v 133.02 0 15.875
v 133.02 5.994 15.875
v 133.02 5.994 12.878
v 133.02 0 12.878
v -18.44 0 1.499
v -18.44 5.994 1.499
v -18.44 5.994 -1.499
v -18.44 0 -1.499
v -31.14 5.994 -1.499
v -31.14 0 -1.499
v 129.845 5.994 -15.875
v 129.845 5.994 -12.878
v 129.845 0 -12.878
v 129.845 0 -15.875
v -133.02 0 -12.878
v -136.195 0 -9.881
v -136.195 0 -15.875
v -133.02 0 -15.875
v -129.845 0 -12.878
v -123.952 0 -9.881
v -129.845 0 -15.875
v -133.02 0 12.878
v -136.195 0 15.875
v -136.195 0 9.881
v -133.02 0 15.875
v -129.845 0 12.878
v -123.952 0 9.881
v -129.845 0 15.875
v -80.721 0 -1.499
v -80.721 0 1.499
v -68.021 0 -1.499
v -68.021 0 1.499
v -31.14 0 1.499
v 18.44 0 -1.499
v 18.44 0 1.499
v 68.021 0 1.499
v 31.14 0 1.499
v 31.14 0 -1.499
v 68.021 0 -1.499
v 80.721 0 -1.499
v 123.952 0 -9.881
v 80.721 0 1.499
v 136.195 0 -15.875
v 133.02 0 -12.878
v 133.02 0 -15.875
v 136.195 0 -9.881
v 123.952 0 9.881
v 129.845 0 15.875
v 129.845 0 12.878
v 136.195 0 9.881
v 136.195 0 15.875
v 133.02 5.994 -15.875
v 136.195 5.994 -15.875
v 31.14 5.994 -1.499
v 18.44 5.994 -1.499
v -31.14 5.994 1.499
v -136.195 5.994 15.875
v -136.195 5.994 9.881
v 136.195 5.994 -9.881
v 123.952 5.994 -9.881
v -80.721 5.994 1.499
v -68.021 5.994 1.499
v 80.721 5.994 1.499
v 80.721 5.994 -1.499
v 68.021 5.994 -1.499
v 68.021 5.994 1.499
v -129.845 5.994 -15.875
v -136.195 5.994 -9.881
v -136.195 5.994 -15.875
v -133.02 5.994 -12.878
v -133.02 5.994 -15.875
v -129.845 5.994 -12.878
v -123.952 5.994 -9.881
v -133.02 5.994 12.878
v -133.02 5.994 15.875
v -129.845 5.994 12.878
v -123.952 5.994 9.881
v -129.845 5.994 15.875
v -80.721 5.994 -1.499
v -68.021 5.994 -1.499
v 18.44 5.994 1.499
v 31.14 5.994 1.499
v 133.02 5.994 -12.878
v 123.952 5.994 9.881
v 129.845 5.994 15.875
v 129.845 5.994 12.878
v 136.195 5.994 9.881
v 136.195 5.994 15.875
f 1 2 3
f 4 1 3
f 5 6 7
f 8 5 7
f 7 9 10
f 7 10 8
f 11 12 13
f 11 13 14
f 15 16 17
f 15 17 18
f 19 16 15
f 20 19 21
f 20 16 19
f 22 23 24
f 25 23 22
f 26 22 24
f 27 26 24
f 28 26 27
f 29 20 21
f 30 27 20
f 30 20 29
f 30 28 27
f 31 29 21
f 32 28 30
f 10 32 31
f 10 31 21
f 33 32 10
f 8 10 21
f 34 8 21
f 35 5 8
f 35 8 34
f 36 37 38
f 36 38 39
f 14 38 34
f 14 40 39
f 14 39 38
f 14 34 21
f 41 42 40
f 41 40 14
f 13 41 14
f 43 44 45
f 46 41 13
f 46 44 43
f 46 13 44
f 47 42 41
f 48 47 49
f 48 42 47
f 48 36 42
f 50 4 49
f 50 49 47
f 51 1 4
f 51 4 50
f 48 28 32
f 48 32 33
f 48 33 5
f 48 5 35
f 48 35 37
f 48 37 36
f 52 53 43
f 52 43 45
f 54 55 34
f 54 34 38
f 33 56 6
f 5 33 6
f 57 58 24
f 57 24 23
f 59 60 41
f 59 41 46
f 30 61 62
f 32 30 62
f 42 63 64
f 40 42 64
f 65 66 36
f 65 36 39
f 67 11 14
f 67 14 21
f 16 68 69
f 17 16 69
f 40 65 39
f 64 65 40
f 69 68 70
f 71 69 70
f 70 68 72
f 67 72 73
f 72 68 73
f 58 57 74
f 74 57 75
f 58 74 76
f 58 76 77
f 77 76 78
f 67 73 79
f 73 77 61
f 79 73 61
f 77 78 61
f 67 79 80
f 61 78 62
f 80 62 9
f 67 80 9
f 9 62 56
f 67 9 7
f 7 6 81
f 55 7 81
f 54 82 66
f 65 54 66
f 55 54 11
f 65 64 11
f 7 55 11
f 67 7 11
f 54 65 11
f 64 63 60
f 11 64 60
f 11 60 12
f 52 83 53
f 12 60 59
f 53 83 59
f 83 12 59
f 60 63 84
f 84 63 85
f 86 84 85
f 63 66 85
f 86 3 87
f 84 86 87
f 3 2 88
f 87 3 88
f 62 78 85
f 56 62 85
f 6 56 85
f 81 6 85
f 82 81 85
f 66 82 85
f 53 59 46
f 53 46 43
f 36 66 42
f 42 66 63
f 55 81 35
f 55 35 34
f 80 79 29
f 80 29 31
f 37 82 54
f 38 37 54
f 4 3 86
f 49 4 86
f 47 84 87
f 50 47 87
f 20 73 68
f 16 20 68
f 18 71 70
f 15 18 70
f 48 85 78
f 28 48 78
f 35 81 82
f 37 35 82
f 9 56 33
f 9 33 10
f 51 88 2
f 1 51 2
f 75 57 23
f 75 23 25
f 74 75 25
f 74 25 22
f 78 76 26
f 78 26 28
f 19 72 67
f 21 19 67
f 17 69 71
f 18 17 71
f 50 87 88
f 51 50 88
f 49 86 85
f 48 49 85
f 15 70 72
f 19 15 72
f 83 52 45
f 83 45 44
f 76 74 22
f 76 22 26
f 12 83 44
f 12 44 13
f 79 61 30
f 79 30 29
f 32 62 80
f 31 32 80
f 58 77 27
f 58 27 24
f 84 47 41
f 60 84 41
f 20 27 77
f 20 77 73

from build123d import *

# Parameters (mm, degrees)
SKETCH1_W                                = 247.904
SKETCH1_H                                = 31.75
BOSS_EXTRUDE1_DEPTH                      = 5.9944
BOSS_EXTRUDE3_DEPTH                      = 5.9944
MIRROR2_AT_THE_SECOND_PLANE_COPY_1_DEPTH = 5.9944
SKETCH3_W                                = 12.7
SKETCH3_H                                = 2.9972
CUT_EXTRUDE1_DEPTH                       = 138.247848812


with BuildPart() as part:
    # Sketch1 → Boss-Extrude1 (new body)
    with BuildSketch(Plane(origin=(0, 0, 0), x_dir=(1, 0, 0), z_dir=(0, 1, 0))):
        Rectangle(SKETCH1_W, SKETCH1_H)
    extrude(amount=BOSS_EXTRUDE1_DEPTH)

    # Sketch4 → Boss-Extrude3 (add)
    with BuildSketch(Plane(origin=(0, 5.9944, 0), x_dir=(1, 0, 0), z_dir=(0, 1, 0))):
        Polygon((-123.952, 9.8806), (-136.1948, 9.8806), (-136.1948, 15.875), (-133.0198, 15.875), (-133.0198, 12.8778), (-129.8448, 12.8778), (-129.8448, 15.875), (-123.952, 15.875), align=None)
    boss_extrude3 = extrude(amount=-BOSS_EXTRUDE3_DEPTH)

    # Mirror2: Boss-Extrude3 across plane
    add(boss_extrude3.mirror(Plane.XY))

    # Mirror2 at the second plane: Boss-Extrude3 across plane
    add(boss_extrude3.mirror(Plane(origin=(0, 0, 0), x_dir=(0, 0, 1), z_dir=(1, 0, 0))))

    # Mirror2 at the second plane copy 1 sketc → Mirror2 at the second plane copy 1 (add)
    with BuildSketch(Plane(origin=(0, 5.9944, 0), x_dir=(-1, 0, 0), z_dir=(0, 1, 0))):
        Polygon((-123.952, 9.8806), (-136.1948, 9.8806), (-136.1948, 15.875), (-133.0198, 15.875), (-133.0198, 12.8778), (-129.8448, 12.8778), (-129.8448, 15.875), (-123.952, 15.875), align=None)
    extrude(amount=-MIRROR2_AT_THE_SECOND_PLANE_COPY_1_DEPTH)

    # Sketch3 → Cut-Extrude1 (cut, through all)
    with BuildSketch(Plane(origin=(0, 5.9944, 0), x_dir=(1, 0, 0), z_dir=(0, 1, 0))):
        with Locations((-74.3712, 0)):
            Rectangle(SKETCH3_W, SKETCH3_H)
        with Locations((-24.7904, 0)):
            Rectangle(SKETCH3_W, SKETCH3_H)
        with Locations((24.7904, 0)):
            Rectangle(SKETCH3_W, SKETCH3_H)
        with Locations((74.3712, 0)):
            Rectangle(SKETCH3_W, SKETCH3_H)
    extrude(amount=-CUT_EXTRUDE1_DEPTH, mode=Mode.SUBTRACT)


solid = part.part
